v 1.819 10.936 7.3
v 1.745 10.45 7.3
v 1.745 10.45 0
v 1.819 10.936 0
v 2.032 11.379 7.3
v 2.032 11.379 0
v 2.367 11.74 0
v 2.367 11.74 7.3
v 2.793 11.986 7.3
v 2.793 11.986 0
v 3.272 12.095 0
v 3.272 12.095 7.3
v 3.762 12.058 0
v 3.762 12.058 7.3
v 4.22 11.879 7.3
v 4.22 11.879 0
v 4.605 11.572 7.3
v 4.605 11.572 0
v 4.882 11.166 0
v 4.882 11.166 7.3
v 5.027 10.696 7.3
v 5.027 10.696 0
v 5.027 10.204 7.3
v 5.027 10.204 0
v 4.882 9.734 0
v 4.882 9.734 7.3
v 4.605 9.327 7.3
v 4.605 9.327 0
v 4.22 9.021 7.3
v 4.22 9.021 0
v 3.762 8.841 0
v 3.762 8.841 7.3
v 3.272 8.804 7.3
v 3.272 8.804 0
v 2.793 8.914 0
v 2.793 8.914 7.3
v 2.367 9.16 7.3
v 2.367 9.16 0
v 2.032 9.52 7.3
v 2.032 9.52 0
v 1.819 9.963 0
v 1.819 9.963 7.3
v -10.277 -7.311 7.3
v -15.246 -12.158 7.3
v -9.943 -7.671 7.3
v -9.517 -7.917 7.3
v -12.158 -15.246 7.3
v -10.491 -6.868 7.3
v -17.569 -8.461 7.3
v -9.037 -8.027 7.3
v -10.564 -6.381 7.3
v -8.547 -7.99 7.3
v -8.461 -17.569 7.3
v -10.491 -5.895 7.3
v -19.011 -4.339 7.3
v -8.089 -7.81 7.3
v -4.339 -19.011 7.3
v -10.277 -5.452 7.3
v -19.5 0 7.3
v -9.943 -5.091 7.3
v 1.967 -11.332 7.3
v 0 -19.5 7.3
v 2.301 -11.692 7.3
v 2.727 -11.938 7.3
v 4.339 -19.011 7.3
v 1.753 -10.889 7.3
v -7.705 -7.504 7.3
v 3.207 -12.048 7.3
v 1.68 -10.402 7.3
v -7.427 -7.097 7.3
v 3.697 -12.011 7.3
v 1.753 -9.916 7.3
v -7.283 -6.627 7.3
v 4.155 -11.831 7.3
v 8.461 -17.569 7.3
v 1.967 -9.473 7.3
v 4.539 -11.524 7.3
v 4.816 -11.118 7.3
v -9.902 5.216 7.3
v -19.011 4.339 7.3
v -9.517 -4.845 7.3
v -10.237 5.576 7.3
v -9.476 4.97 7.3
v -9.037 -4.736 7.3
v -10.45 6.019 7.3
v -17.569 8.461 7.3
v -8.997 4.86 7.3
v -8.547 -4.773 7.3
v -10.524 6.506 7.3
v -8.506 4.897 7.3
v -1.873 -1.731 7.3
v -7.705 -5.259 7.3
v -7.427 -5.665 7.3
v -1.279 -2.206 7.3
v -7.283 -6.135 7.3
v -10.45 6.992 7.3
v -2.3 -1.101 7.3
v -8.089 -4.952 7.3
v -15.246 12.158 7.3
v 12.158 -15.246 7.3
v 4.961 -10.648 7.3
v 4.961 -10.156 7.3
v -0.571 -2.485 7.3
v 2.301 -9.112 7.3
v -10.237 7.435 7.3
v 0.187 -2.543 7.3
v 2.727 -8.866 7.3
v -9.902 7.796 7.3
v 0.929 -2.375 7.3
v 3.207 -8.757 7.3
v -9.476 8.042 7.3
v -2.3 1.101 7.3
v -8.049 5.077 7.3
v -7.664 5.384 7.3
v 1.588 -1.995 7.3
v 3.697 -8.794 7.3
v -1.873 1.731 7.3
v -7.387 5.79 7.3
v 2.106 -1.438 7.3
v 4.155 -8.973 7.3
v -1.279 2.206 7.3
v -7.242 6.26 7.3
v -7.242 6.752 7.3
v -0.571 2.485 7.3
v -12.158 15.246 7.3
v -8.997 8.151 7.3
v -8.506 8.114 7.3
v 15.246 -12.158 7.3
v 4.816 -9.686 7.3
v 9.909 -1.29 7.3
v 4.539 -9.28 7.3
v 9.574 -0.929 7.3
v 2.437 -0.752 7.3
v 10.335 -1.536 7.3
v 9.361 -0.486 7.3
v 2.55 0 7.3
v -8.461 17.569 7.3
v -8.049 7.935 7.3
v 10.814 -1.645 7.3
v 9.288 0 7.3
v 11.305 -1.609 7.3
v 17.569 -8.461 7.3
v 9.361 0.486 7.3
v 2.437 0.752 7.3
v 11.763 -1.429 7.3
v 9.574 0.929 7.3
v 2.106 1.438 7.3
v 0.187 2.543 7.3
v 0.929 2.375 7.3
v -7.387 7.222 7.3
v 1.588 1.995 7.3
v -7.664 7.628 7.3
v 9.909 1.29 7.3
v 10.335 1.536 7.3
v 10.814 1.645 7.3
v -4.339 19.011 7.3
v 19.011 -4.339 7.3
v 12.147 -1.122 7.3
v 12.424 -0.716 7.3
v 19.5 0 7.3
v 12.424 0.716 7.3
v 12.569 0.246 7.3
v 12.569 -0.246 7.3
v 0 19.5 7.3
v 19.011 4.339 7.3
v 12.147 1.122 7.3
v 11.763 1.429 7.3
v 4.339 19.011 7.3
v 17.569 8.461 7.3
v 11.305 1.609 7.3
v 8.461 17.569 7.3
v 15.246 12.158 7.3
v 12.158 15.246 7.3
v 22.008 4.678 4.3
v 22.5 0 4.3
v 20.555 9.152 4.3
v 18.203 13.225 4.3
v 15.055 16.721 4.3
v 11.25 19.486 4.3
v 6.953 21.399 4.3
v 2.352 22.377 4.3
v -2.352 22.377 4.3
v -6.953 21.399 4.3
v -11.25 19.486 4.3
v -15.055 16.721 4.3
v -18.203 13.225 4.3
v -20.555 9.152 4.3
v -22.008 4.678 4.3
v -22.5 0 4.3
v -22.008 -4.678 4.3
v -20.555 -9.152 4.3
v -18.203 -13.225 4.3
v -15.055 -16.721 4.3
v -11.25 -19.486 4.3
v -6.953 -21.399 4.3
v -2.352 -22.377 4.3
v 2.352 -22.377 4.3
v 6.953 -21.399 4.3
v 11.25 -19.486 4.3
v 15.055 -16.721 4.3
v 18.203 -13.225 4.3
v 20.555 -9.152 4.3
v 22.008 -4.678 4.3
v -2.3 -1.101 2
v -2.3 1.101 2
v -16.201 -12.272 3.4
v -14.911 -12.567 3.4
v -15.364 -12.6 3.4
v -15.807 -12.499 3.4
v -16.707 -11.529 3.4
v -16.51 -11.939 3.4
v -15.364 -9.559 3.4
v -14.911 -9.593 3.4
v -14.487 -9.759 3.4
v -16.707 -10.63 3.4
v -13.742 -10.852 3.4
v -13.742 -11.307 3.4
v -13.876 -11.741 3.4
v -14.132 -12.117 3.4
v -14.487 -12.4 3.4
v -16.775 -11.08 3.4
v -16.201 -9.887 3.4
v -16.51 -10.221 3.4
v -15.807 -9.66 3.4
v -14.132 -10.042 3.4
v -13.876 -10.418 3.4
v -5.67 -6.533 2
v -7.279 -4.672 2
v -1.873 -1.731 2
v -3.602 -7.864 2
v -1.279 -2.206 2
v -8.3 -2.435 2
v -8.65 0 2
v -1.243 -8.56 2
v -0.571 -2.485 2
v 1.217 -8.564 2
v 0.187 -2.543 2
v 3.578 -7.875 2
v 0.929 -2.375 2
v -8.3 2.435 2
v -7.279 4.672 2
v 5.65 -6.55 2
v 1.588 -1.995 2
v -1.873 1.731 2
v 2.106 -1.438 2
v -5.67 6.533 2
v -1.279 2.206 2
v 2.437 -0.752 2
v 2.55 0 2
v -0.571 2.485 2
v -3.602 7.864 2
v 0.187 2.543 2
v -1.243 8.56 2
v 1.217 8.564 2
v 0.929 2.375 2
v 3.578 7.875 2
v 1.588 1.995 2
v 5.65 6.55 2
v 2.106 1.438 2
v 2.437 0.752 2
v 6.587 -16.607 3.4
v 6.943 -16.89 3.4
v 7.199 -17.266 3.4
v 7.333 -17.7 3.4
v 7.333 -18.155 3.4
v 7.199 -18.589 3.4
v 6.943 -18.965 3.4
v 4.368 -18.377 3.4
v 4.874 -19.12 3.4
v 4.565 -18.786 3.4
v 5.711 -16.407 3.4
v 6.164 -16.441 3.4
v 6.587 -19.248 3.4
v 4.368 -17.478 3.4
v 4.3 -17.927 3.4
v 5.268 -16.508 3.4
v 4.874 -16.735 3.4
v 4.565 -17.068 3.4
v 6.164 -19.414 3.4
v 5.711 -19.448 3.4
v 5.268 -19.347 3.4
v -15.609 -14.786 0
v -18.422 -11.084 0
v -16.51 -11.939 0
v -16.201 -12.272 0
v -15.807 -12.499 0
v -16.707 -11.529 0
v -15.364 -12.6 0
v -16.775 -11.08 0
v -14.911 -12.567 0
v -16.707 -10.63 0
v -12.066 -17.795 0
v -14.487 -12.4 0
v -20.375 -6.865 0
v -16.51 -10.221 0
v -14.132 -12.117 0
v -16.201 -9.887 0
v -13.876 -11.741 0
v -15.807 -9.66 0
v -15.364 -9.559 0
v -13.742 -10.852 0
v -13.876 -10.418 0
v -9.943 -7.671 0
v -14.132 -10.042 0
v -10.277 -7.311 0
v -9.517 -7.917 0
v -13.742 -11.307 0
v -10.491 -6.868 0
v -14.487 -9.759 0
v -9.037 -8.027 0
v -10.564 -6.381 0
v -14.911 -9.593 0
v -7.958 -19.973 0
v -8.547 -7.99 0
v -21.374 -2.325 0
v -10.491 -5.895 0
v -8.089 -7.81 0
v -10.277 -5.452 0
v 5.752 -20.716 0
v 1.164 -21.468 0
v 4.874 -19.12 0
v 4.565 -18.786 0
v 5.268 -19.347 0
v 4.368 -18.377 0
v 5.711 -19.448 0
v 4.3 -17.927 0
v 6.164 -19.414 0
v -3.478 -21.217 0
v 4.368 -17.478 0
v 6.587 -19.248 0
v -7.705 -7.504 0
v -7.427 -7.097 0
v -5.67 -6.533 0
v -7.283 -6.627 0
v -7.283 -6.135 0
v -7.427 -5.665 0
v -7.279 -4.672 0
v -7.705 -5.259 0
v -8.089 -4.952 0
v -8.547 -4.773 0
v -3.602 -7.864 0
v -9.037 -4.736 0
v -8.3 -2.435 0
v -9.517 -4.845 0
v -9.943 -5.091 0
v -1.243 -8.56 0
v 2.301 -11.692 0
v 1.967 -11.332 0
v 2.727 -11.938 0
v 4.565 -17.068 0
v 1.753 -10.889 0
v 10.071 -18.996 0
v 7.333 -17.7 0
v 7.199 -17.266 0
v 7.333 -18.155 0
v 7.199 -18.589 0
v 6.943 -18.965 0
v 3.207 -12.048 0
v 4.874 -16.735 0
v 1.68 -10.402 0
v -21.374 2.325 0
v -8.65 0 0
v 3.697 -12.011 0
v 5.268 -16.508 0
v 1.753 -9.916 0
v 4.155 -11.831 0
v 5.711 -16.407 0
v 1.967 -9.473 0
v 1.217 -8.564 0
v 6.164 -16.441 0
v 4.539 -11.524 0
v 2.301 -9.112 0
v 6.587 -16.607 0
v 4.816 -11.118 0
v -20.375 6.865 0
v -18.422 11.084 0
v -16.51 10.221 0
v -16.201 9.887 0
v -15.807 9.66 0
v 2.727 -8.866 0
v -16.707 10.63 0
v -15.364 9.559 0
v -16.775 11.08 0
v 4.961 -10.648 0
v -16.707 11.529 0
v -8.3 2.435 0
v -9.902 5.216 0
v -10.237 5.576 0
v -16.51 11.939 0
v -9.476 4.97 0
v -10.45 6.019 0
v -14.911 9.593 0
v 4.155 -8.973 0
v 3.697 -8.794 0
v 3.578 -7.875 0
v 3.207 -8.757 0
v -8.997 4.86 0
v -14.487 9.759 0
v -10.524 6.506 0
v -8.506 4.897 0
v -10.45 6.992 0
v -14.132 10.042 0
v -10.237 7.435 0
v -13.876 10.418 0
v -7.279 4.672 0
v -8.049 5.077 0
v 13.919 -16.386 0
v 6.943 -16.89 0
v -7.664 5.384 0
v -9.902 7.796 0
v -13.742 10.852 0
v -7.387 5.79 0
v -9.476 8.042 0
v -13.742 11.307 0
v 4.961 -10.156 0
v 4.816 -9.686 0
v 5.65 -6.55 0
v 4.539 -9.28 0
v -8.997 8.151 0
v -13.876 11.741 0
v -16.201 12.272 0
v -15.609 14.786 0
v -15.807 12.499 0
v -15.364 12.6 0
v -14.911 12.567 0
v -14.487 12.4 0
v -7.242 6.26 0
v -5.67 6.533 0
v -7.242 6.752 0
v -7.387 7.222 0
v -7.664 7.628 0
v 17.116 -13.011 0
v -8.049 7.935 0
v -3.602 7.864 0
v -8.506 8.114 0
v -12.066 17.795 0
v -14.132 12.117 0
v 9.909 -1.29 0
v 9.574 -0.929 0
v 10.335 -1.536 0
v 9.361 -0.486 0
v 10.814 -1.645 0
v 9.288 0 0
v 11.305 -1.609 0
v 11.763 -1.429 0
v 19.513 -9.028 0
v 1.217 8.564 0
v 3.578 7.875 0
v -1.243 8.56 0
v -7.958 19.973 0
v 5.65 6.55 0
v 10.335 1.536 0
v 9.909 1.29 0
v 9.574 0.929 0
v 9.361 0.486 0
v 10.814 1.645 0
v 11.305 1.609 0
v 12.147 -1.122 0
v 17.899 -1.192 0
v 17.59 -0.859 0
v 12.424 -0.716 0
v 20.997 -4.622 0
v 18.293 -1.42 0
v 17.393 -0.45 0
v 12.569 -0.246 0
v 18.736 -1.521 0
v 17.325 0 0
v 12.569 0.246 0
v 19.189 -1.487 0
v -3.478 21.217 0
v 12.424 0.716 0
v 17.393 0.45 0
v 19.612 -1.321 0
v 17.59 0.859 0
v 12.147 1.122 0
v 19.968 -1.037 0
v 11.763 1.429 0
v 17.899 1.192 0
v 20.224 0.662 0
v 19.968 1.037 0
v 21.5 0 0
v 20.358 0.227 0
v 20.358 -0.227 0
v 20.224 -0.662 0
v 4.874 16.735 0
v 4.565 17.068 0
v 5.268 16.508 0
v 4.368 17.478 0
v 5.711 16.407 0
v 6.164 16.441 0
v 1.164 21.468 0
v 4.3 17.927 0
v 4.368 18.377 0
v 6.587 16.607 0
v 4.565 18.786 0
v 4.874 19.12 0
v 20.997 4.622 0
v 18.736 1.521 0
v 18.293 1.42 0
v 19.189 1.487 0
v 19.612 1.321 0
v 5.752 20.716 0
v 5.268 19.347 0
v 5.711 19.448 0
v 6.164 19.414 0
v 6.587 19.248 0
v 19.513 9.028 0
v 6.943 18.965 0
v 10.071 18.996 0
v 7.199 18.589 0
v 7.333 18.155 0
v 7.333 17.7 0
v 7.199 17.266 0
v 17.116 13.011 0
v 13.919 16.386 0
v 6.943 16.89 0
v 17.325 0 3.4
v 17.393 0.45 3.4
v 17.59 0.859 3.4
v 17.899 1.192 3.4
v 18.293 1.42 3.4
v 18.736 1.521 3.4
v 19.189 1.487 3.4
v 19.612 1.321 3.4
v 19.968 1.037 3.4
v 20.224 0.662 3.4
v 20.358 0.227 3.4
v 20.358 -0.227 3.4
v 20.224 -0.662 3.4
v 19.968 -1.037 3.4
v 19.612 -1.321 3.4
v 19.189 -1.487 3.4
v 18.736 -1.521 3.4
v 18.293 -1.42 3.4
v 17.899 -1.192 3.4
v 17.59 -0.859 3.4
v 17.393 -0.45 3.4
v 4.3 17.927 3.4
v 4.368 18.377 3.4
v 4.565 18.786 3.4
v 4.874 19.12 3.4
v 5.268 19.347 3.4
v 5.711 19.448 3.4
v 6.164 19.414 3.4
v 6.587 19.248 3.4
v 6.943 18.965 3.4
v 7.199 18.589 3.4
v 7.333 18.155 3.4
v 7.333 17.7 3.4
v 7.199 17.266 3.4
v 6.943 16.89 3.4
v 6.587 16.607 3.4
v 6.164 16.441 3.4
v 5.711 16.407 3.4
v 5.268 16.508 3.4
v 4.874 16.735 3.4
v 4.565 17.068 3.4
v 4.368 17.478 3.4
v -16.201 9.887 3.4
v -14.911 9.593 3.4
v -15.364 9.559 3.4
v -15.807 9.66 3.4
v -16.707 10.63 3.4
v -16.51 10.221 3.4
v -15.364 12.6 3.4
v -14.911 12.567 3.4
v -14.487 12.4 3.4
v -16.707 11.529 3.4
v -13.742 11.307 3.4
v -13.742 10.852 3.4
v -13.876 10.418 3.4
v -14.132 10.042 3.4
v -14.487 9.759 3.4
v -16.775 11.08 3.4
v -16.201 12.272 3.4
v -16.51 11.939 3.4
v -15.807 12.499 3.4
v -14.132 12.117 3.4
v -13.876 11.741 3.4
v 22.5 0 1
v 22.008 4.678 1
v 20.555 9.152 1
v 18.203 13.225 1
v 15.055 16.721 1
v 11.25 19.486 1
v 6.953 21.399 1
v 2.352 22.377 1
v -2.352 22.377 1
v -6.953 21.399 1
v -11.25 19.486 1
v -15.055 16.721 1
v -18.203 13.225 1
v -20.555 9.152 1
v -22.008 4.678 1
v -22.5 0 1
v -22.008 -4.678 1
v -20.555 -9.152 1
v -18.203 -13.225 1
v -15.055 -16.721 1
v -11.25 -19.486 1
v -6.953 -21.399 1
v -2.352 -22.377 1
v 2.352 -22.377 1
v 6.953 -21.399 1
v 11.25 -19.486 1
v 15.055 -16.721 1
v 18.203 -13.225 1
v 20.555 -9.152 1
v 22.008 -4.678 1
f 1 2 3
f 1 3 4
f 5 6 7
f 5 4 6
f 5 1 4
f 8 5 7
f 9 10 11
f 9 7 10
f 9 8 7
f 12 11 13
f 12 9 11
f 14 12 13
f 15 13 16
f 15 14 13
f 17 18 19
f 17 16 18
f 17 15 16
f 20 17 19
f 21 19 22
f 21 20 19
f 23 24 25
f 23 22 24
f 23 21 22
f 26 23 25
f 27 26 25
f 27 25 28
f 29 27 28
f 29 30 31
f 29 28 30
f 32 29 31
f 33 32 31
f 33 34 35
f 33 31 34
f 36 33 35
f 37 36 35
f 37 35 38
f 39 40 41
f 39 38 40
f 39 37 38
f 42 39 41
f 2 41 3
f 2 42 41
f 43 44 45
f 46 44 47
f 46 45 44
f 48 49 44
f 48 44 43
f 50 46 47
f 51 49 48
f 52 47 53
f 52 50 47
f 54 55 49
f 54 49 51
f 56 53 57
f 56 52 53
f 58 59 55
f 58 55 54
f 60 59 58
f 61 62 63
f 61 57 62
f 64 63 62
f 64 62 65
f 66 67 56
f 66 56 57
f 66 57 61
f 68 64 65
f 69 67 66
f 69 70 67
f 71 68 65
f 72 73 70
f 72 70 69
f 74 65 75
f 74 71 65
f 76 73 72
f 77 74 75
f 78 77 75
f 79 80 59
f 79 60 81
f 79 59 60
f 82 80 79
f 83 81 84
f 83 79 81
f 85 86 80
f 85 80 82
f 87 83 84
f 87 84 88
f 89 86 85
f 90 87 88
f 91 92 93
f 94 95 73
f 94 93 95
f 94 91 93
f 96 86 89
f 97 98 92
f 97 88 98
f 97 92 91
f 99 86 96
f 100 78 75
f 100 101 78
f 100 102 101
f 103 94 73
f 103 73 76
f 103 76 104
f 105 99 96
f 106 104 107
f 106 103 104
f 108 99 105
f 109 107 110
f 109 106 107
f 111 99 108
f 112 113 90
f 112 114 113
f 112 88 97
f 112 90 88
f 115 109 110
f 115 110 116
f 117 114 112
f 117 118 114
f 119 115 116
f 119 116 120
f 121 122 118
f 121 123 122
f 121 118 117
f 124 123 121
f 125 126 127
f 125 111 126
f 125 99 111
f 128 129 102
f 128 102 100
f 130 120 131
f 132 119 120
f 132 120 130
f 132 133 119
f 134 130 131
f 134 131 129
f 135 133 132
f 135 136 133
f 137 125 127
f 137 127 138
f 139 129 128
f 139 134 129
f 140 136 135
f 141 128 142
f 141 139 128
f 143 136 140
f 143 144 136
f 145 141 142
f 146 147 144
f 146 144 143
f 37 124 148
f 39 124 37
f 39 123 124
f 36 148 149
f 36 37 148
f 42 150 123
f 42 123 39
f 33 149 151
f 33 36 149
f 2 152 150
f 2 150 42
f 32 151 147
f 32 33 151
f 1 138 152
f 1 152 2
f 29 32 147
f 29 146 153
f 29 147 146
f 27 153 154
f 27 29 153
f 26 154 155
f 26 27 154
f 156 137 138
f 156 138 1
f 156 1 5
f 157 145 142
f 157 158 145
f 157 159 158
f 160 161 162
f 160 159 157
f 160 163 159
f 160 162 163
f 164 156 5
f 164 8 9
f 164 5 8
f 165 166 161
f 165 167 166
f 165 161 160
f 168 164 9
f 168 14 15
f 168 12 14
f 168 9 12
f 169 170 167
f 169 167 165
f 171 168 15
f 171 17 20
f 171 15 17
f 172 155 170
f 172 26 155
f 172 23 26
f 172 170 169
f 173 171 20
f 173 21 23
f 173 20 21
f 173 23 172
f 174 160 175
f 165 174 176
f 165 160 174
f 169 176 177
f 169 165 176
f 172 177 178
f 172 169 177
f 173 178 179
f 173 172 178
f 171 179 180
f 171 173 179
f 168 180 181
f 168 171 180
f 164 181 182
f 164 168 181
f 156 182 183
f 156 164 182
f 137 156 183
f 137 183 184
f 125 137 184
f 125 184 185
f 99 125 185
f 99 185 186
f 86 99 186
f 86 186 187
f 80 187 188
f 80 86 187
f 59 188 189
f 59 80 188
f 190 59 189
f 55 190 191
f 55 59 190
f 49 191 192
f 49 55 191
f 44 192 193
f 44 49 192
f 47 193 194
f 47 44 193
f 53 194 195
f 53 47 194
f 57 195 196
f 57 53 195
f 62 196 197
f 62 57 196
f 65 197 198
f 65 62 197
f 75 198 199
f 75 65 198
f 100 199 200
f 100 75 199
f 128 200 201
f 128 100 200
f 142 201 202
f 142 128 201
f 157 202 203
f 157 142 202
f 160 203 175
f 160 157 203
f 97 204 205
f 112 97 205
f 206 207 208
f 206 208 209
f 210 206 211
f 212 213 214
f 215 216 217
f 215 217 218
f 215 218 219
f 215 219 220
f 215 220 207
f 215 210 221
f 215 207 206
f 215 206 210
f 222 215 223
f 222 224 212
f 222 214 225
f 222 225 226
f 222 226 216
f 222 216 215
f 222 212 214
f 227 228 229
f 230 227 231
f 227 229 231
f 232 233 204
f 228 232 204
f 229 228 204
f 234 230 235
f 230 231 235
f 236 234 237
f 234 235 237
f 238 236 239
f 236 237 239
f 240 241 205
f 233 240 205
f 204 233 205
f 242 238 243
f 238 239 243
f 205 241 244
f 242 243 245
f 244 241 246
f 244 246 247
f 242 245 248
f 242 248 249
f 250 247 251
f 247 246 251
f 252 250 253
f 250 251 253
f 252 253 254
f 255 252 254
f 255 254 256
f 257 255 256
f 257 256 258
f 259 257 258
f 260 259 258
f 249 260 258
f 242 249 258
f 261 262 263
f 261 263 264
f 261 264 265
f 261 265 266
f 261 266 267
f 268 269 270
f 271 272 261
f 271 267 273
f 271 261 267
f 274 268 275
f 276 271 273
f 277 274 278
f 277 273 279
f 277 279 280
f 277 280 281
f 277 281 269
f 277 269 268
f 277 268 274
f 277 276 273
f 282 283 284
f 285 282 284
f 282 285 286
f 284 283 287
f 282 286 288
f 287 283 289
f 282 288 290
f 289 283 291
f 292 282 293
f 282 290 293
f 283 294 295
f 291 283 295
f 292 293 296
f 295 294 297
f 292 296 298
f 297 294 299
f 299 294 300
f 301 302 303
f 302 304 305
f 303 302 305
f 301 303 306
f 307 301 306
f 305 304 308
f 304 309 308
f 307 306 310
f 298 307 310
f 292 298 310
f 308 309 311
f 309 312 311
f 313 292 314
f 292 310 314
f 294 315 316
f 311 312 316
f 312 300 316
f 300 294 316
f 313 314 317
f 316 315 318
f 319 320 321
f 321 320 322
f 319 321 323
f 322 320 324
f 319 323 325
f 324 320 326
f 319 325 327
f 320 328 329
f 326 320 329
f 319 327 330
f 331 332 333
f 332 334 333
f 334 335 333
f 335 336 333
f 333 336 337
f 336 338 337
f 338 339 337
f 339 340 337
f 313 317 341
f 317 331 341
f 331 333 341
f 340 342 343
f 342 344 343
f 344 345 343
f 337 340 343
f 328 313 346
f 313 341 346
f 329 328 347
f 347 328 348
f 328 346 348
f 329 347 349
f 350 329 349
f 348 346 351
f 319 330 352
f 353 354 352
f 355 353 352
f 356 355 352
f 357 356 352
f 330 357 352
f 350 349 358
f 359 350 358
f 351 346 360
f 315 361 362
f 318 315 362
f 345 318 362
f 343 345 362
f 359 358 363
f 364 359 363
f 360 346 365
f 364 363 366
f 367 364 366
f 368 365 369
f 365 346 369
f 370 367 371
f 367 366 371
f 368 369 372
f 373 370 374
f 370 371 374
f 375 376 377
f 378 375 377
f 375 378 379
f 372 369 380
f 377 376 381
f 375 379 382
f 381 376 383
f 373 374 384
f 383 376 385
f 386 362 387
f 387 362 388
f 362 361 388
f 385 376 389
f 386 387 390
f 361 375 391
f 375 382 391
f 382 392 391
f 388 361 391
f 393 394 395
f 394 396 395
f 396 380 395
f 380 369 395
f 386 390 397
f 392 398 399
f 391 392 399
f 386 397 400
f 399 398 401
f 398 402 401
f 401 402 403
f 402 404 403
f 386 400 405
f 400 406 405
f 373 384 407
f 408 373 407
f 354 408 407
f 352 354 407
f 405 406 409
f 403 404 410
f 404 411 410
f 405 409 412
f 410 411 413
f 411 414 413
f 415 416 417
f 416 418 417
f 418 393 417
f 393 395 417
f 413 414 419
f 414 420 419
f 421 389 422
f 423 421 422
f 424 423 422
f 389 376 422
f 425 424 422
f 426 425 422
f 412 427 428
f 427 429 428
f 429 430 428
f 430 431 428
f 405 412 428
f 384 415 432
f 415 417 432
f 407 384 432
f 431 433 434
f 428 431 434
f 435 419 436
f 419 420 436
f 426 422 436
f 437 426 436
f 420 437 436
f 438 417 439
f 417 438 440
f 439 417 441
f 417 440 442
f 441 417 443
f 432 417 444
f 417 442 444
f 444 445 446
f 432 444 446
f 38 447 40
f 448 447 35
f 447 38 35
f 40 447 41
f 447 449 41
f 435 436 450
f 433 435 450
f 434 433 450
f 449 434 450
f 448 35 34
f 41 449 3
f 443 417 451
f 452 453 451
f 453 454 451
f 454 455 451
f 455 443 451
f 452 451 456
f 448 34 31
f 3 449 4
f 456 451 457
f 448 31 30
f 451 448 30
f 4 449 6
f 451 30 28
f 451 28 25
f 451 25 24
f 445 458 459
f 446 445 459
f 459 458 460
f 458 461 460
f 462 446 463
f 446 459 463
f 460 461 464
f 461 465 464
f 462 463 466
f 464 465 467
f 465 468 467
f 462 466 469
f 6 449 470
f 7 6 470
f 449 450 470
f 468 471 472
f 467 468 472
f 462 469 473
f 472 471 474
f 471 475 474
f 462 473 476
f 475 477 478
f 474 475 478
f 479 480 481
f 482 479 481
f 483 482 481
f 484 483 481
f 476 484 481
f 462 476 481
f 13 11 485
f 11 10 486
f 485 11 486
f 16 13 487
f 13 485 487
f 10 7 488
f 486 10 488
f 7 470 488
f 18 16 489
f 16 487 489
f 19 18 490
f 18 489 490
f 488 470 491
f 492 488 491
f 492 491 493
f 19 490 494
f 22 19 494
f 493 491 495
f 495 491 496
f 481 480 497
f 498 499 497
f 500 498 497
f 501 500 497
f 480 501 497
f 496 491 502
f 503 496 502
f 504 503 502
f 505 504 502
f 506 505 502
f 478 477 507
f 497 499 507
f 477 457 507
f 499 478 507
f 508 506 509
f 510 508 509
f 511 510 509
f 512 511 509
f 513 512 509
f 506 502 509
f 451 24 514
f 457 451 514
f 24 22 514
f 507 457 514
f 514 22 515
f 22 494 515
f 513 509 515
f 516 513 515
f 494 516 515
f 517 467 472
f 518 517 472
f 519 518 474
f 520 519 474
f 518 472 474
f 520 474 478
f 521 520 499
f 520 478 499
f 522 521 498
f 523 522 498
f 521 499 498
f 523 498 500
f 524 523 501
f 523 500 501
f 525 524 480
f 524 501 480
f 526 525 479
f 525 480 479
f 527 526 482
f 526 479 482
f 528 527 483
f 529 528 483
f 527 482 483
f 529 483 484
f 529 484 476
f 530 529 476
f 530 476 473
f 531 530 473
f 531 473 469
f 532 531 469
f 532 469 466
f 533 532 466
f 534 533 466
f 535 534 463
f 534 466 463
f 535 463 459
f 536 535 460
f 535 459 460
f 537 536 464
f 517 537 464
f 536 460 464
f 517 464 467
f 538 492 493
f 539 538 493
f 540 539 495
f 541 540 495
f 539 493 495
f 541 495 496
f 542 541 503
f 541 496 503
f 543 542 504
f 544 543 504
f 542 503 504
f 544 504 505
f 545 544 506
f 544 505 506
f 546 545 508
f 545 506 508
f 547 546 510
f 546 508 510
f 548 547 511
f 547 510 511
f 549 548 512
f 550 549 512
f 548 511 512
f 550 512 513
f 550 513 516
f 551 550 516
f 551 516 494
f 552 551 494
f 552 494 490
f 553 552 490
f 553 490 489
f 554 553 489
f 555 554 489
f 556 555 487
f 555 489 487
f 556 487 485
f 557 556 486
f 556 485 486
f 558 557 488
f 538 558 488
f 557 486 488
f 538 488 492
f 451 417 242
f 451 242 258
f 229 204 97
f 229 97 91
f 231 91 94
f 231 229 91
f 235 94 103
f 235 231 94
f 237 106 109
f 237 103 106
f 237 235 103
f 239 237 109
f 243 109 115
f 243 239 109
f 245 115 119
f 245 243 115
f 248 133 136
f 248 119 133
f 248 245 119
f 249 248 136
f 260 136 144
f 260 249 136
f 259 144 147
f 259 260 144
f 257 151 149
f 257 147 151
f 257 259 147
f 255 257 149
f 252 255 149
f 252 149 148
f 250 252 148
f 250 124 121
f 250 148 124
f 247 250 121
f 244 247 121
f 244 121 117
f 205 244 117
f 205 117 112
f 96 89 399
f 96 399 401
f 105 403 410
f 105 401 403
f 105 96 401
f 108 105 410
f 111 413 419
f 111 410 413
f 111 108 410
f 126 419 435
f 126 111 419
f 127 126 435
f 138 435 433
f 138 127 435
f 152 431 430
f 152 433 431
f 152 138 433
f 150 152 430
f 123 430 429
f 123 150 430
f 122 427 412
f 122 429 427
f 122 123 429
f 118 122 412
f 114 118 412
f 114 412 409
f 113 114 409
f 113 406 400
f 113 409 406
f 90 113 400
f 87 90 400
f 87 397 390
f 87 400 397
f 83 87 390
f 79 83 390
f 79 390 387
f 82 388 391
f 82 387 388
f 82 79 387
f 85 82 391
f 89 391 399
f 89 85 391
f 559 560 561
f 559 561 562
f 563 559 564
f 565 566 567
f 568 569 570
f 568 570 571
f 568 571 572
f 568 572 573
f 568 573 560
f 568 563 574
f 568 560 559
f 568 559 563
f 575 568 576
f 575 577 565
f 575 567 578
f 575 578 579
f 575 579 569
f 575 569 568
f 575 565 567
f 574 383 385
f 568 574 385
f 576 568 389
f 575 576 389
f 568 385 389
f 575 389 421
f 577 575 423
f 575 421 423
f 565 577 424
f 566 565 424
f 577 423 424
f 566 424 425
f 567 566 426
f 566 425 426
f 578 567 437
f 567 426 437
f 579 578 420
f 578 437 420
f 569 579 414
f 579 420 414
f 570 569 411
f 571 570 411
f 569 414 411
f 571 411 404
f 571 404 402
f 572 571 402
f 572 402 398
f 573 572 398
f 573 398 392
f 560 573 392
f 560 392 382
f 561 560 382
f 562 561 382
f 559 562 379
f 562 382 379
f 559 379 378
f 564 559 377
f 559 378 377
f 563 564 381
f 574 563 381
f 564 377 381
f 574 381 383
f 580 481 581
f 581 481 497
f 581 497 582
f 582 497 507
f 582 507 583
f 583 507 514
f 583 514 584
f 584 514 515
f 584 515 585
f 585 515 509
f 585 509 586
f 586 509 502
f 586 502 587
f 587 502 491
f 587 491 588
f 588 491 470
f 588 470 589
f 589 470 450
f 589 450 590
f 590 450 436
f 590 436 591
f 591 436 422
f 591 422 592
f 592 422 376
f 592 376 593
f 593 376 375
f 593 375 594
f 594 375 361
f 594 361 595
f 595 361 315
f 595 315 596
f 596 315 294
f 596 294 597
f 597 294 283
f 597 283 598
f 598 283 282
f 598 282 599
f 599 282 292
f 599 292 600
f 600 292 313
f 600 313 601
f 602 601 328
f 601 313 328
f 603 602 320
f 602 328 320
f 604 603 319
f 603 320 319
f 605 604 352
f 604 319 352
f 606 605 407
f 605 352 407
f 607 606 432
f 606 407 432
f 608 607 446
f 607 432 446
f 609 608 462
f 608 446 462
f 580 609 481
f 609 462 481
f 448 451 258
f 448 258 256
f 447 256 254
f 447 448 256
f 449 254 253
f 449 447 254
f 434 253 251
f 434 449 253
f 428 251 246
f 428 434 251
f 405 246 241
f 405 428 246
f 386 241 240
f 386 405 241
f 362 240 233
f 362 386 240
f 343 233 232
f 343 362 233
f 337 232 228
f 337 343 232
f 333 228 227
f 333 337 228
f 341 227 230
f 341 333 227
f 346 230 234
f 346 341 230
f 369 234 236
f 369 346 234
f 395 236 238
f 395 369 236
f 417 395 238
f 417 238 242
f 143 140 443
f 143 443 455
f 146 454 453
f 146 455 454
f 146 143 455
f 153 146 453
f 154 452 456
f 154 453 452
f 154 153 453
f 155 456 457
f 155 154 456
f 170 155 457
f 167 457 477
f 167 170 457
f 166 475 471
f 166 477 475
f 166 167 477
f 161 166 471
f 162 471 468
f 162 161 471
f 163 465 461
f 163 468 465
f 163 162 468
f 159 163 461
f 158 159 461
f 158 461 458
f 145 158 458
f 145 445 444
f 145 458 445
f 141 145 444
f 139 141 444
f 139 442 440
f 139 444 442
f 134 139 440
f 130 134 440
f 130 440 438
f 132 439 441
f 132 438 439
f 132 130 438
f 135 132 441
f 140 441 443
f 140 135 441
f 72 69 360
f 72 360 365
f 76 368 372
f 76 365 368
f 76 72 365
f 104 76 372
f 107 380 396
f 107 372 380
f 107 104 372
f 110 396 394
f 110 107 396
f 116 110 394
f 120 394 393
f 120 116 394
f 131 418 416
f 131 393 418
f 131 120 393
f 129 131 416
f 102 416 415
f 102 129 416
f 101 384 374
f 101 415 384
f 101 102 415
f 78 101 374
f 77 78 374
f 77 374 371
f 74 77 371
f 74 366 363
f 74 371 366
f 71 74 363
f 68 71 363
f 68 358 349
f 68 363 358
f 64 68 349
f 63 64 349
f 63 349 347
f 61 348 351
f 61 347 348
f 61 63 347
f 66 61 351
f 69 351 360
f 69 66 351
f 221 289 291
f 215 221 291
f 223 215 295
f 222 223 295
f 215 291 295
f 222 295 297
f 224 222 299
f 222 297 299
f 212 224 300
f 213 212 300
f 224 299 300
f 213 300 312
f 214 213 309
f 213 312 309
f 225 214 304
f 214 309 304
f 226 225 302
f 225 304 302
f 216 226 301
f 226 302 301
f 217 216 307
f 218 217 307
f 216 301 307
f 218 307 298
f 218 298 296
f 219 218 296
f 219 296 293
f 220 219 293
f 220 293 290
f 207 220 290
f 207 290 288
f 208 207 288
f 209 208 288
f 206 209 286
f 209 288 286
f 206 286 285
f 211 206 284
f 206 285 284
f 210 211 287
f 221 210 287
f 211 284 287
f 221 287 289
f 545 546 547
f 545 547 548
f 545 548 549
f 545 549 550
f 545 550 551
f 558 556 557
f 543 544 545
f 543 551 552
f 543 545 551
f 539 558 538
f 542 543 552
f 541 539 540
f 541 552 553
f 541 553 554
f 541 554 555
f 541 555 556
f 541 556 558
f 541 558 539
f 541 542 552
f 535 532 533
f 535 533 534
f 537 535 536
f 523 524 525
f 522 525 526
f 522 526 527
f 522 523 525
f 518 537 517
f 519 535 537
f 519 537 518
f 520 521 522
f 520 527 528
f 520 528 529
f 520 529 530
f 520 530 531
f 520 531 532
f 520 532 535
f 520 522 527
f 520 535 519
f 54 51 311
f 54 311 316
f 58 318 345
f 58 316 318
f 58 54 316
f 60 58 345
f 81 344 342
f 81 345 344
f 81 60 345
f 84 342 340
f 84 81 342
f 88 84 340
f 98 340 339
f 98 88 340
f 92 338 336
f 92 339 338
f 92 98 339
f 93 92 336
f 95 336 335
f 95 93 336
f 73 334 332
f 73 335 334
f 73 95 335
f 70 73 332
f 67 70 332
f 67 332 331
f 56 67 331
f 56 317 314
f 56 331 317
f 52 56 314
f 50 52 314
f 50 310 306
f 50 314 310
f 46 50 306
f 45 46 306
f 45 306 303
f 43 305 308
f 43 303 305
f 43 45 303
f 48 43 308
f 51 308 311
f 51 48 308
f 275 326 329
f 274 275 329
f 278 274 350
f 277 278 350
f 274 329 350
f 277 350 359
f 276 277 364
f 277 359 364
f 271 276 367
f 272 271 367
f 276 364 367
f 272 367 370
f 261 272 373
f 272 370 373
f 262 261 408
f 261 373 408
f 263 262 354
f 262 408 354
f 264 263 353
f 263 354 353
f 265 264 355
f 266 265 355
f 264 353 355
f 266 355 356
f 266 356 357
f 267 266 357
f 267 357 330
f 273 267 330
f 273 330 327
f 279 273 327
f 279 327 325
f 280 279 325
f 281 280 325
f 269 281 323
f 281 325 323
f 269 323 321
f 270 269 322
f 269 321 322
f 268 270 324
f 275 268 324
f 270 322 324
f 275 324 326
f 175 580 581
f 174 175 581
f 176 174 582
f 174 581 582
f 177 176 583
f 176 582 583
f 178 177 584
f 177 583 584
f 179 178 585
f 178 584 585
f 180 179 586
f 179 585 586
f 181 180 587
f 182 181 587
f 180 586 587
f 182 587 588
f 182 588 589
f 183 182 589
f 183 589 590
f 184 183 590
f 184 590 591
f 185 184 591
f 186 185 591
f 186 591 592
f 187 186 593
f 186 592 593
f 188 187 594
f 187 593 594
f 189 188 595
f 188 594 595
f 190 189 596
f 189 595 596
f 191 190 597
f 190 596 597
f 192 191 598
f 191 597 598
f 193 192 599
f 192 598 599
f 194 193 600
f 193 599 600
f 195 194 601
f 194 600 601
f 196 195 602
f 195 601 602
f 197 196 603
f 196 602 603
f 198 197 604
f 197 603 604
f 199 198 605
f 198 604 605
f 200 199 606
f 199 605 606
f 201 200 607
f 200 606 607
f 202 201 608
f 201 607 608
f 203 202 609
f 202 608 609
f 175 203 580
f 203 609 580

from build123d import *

# Parameters (mm, degrees)
SKETCH1_R               = 22.5
SKETCH1_R_2             = 2.55
BOSS_EXTRUDE1_DEPTH     = 7.3
SKETCH2_R               = 1.525
CUT_EXTRUDE1_DEPTH      = 3.4
CUT_EXTRUDE2_DEPTH      = 33.646439316
CUT_EXTRUDE2_DEPTH_BACK = 33.646439316
SKETCH3_R               = 2.55
SKETCH3_R_2             = 1.65
CHAMFER7_SIZE           = 1
CHAMFER8_SIZE           = 3
CUT_EXTRUDE3_DEPTH      = 2
BOSS_EXTRUDE2_START     = -5.3
BOSS_EXTRUDE2_DEPTH     = 5.3


with BuildPart() as part:
    # Sketch1 → Boss-Extrude1 (new body)
    with BuildSketch(Plane.XY):
        Circle(SKETCH1_R)
        Circle(SKETCH1_R_2, mode=Mode.SUBTRACT)
    extrude(amount=BOSS_EXTRUDE1_DEPTH)

    # Sketch2 → Cut-Extrude1 (cut)
    with BuildSketch(Plane(origin=(0, 0, 0), x_dir=(-1, 0, 0), z_dir=(0, 0, -1))):
        with Locations((-18.85, 0)):
            Circle(SKETCH2_R)
        with Locations((-5.824970344, 17.927415332)):
            Circle(SKETCH2_R)
        with Locations((15.249970344, 11.079752006)):
            Circle(SKETCH2_R)
        with Locations((15.249970344, -11.079752006)):
            Circle(SKETCH2_R)
        with Locations((-5.824970344, -17.927415332)):
            Circle(SKETCH2_R)
    extrude(amount=-CUT_EXTRUDE1_DEPTH, mode=Mode.SUBTRACT)

    # Sketch3 → Cut-Extrude2 (cut, two sides: drawn at the far end of the back side and taken through both)
    with BuildSketch(Plane(origin=(0, 0, 0), x_dir=(-1, 0, 0), z_dir=(0, 0, -1)).offset(-CUT_EXTRUDE2_DEPTH_BACK)):
        with Locations(Location((0, 0, 0), (0, 0, 180))):
            Circle(SKETCH3_R)
        with Locations((-10.9375, 0)):
            Circle(SKETCH3_R_2)
        with Locations((-3.395324226, 10.449733473)):
            Circle(SKETCH3_R_2)
        with Locations((8.873623376, 6.505843285)):
            Circle(SKETCH3_R_2)
        with Locations((8.914074226, -6.381348371)):
            Circle(SKETCH3_R_2)
        with Locations((-3.329873376, -10.402180647)):
            Circle(SKETCH3_R_2)
    extrude(amount=CUT_EXTRUDE2_DEPTH + CUT_EXTRUDE2_DEPTH_BACK, mode=Mode.SUBTRACT)

    # Chamfer7
    chamfer7_edges = [part.edges().sort_by_distance(p)[0] for p in [
        (-22.5, 0, 0),
    ]]
    chamfer(chamfer7_edges, length=CHAMFER7_SIZE)

    # Chamfer8
    chamfer8_edges = [part.edges().sort_by_distance(p)[0] for p in [
        (-22.5, 0, 7.3),
    ]]
    chamfer(chamfer8_edges, length=CHAMFER8_SIZE)

    # Sketch8 → Cut-Extrude3 (cut)
    with BuildSketch(Plane(origin=(0, 0, 0), x_dir=(-1, 0, 0), z_dir=(0, 0, -1))):
        with BuildLine():
            Line((-5.65, -6.549809158), (-5.65, 6.549809158))
            ThreePointArc((-5.65, 6.549809158), (8.65, 0), (-5.65, -6.549809158))
        make_face()
    extrude(amount=-CUT_EXTRUDE3_DEPTH, mode=Mode.SUBTRACT)

    # Sketch10 → Boss-Extrude2 (add)
    with BuildSketch(Plane.XY.offset(7.3).offset(BOSS_EXTRUDE2_START)):
        with BuildLine():
            Line((-2.3, -1.101135777), (-2.3, 1.101135777))
            ThreePointArc((-2.3, 1.101135777), (-2.55, 0), (-2.3, -1.101135777))
        make_face()
    extrude(amount=BOSS_EXTRUDE2_DEPTH)


solid = part.part
